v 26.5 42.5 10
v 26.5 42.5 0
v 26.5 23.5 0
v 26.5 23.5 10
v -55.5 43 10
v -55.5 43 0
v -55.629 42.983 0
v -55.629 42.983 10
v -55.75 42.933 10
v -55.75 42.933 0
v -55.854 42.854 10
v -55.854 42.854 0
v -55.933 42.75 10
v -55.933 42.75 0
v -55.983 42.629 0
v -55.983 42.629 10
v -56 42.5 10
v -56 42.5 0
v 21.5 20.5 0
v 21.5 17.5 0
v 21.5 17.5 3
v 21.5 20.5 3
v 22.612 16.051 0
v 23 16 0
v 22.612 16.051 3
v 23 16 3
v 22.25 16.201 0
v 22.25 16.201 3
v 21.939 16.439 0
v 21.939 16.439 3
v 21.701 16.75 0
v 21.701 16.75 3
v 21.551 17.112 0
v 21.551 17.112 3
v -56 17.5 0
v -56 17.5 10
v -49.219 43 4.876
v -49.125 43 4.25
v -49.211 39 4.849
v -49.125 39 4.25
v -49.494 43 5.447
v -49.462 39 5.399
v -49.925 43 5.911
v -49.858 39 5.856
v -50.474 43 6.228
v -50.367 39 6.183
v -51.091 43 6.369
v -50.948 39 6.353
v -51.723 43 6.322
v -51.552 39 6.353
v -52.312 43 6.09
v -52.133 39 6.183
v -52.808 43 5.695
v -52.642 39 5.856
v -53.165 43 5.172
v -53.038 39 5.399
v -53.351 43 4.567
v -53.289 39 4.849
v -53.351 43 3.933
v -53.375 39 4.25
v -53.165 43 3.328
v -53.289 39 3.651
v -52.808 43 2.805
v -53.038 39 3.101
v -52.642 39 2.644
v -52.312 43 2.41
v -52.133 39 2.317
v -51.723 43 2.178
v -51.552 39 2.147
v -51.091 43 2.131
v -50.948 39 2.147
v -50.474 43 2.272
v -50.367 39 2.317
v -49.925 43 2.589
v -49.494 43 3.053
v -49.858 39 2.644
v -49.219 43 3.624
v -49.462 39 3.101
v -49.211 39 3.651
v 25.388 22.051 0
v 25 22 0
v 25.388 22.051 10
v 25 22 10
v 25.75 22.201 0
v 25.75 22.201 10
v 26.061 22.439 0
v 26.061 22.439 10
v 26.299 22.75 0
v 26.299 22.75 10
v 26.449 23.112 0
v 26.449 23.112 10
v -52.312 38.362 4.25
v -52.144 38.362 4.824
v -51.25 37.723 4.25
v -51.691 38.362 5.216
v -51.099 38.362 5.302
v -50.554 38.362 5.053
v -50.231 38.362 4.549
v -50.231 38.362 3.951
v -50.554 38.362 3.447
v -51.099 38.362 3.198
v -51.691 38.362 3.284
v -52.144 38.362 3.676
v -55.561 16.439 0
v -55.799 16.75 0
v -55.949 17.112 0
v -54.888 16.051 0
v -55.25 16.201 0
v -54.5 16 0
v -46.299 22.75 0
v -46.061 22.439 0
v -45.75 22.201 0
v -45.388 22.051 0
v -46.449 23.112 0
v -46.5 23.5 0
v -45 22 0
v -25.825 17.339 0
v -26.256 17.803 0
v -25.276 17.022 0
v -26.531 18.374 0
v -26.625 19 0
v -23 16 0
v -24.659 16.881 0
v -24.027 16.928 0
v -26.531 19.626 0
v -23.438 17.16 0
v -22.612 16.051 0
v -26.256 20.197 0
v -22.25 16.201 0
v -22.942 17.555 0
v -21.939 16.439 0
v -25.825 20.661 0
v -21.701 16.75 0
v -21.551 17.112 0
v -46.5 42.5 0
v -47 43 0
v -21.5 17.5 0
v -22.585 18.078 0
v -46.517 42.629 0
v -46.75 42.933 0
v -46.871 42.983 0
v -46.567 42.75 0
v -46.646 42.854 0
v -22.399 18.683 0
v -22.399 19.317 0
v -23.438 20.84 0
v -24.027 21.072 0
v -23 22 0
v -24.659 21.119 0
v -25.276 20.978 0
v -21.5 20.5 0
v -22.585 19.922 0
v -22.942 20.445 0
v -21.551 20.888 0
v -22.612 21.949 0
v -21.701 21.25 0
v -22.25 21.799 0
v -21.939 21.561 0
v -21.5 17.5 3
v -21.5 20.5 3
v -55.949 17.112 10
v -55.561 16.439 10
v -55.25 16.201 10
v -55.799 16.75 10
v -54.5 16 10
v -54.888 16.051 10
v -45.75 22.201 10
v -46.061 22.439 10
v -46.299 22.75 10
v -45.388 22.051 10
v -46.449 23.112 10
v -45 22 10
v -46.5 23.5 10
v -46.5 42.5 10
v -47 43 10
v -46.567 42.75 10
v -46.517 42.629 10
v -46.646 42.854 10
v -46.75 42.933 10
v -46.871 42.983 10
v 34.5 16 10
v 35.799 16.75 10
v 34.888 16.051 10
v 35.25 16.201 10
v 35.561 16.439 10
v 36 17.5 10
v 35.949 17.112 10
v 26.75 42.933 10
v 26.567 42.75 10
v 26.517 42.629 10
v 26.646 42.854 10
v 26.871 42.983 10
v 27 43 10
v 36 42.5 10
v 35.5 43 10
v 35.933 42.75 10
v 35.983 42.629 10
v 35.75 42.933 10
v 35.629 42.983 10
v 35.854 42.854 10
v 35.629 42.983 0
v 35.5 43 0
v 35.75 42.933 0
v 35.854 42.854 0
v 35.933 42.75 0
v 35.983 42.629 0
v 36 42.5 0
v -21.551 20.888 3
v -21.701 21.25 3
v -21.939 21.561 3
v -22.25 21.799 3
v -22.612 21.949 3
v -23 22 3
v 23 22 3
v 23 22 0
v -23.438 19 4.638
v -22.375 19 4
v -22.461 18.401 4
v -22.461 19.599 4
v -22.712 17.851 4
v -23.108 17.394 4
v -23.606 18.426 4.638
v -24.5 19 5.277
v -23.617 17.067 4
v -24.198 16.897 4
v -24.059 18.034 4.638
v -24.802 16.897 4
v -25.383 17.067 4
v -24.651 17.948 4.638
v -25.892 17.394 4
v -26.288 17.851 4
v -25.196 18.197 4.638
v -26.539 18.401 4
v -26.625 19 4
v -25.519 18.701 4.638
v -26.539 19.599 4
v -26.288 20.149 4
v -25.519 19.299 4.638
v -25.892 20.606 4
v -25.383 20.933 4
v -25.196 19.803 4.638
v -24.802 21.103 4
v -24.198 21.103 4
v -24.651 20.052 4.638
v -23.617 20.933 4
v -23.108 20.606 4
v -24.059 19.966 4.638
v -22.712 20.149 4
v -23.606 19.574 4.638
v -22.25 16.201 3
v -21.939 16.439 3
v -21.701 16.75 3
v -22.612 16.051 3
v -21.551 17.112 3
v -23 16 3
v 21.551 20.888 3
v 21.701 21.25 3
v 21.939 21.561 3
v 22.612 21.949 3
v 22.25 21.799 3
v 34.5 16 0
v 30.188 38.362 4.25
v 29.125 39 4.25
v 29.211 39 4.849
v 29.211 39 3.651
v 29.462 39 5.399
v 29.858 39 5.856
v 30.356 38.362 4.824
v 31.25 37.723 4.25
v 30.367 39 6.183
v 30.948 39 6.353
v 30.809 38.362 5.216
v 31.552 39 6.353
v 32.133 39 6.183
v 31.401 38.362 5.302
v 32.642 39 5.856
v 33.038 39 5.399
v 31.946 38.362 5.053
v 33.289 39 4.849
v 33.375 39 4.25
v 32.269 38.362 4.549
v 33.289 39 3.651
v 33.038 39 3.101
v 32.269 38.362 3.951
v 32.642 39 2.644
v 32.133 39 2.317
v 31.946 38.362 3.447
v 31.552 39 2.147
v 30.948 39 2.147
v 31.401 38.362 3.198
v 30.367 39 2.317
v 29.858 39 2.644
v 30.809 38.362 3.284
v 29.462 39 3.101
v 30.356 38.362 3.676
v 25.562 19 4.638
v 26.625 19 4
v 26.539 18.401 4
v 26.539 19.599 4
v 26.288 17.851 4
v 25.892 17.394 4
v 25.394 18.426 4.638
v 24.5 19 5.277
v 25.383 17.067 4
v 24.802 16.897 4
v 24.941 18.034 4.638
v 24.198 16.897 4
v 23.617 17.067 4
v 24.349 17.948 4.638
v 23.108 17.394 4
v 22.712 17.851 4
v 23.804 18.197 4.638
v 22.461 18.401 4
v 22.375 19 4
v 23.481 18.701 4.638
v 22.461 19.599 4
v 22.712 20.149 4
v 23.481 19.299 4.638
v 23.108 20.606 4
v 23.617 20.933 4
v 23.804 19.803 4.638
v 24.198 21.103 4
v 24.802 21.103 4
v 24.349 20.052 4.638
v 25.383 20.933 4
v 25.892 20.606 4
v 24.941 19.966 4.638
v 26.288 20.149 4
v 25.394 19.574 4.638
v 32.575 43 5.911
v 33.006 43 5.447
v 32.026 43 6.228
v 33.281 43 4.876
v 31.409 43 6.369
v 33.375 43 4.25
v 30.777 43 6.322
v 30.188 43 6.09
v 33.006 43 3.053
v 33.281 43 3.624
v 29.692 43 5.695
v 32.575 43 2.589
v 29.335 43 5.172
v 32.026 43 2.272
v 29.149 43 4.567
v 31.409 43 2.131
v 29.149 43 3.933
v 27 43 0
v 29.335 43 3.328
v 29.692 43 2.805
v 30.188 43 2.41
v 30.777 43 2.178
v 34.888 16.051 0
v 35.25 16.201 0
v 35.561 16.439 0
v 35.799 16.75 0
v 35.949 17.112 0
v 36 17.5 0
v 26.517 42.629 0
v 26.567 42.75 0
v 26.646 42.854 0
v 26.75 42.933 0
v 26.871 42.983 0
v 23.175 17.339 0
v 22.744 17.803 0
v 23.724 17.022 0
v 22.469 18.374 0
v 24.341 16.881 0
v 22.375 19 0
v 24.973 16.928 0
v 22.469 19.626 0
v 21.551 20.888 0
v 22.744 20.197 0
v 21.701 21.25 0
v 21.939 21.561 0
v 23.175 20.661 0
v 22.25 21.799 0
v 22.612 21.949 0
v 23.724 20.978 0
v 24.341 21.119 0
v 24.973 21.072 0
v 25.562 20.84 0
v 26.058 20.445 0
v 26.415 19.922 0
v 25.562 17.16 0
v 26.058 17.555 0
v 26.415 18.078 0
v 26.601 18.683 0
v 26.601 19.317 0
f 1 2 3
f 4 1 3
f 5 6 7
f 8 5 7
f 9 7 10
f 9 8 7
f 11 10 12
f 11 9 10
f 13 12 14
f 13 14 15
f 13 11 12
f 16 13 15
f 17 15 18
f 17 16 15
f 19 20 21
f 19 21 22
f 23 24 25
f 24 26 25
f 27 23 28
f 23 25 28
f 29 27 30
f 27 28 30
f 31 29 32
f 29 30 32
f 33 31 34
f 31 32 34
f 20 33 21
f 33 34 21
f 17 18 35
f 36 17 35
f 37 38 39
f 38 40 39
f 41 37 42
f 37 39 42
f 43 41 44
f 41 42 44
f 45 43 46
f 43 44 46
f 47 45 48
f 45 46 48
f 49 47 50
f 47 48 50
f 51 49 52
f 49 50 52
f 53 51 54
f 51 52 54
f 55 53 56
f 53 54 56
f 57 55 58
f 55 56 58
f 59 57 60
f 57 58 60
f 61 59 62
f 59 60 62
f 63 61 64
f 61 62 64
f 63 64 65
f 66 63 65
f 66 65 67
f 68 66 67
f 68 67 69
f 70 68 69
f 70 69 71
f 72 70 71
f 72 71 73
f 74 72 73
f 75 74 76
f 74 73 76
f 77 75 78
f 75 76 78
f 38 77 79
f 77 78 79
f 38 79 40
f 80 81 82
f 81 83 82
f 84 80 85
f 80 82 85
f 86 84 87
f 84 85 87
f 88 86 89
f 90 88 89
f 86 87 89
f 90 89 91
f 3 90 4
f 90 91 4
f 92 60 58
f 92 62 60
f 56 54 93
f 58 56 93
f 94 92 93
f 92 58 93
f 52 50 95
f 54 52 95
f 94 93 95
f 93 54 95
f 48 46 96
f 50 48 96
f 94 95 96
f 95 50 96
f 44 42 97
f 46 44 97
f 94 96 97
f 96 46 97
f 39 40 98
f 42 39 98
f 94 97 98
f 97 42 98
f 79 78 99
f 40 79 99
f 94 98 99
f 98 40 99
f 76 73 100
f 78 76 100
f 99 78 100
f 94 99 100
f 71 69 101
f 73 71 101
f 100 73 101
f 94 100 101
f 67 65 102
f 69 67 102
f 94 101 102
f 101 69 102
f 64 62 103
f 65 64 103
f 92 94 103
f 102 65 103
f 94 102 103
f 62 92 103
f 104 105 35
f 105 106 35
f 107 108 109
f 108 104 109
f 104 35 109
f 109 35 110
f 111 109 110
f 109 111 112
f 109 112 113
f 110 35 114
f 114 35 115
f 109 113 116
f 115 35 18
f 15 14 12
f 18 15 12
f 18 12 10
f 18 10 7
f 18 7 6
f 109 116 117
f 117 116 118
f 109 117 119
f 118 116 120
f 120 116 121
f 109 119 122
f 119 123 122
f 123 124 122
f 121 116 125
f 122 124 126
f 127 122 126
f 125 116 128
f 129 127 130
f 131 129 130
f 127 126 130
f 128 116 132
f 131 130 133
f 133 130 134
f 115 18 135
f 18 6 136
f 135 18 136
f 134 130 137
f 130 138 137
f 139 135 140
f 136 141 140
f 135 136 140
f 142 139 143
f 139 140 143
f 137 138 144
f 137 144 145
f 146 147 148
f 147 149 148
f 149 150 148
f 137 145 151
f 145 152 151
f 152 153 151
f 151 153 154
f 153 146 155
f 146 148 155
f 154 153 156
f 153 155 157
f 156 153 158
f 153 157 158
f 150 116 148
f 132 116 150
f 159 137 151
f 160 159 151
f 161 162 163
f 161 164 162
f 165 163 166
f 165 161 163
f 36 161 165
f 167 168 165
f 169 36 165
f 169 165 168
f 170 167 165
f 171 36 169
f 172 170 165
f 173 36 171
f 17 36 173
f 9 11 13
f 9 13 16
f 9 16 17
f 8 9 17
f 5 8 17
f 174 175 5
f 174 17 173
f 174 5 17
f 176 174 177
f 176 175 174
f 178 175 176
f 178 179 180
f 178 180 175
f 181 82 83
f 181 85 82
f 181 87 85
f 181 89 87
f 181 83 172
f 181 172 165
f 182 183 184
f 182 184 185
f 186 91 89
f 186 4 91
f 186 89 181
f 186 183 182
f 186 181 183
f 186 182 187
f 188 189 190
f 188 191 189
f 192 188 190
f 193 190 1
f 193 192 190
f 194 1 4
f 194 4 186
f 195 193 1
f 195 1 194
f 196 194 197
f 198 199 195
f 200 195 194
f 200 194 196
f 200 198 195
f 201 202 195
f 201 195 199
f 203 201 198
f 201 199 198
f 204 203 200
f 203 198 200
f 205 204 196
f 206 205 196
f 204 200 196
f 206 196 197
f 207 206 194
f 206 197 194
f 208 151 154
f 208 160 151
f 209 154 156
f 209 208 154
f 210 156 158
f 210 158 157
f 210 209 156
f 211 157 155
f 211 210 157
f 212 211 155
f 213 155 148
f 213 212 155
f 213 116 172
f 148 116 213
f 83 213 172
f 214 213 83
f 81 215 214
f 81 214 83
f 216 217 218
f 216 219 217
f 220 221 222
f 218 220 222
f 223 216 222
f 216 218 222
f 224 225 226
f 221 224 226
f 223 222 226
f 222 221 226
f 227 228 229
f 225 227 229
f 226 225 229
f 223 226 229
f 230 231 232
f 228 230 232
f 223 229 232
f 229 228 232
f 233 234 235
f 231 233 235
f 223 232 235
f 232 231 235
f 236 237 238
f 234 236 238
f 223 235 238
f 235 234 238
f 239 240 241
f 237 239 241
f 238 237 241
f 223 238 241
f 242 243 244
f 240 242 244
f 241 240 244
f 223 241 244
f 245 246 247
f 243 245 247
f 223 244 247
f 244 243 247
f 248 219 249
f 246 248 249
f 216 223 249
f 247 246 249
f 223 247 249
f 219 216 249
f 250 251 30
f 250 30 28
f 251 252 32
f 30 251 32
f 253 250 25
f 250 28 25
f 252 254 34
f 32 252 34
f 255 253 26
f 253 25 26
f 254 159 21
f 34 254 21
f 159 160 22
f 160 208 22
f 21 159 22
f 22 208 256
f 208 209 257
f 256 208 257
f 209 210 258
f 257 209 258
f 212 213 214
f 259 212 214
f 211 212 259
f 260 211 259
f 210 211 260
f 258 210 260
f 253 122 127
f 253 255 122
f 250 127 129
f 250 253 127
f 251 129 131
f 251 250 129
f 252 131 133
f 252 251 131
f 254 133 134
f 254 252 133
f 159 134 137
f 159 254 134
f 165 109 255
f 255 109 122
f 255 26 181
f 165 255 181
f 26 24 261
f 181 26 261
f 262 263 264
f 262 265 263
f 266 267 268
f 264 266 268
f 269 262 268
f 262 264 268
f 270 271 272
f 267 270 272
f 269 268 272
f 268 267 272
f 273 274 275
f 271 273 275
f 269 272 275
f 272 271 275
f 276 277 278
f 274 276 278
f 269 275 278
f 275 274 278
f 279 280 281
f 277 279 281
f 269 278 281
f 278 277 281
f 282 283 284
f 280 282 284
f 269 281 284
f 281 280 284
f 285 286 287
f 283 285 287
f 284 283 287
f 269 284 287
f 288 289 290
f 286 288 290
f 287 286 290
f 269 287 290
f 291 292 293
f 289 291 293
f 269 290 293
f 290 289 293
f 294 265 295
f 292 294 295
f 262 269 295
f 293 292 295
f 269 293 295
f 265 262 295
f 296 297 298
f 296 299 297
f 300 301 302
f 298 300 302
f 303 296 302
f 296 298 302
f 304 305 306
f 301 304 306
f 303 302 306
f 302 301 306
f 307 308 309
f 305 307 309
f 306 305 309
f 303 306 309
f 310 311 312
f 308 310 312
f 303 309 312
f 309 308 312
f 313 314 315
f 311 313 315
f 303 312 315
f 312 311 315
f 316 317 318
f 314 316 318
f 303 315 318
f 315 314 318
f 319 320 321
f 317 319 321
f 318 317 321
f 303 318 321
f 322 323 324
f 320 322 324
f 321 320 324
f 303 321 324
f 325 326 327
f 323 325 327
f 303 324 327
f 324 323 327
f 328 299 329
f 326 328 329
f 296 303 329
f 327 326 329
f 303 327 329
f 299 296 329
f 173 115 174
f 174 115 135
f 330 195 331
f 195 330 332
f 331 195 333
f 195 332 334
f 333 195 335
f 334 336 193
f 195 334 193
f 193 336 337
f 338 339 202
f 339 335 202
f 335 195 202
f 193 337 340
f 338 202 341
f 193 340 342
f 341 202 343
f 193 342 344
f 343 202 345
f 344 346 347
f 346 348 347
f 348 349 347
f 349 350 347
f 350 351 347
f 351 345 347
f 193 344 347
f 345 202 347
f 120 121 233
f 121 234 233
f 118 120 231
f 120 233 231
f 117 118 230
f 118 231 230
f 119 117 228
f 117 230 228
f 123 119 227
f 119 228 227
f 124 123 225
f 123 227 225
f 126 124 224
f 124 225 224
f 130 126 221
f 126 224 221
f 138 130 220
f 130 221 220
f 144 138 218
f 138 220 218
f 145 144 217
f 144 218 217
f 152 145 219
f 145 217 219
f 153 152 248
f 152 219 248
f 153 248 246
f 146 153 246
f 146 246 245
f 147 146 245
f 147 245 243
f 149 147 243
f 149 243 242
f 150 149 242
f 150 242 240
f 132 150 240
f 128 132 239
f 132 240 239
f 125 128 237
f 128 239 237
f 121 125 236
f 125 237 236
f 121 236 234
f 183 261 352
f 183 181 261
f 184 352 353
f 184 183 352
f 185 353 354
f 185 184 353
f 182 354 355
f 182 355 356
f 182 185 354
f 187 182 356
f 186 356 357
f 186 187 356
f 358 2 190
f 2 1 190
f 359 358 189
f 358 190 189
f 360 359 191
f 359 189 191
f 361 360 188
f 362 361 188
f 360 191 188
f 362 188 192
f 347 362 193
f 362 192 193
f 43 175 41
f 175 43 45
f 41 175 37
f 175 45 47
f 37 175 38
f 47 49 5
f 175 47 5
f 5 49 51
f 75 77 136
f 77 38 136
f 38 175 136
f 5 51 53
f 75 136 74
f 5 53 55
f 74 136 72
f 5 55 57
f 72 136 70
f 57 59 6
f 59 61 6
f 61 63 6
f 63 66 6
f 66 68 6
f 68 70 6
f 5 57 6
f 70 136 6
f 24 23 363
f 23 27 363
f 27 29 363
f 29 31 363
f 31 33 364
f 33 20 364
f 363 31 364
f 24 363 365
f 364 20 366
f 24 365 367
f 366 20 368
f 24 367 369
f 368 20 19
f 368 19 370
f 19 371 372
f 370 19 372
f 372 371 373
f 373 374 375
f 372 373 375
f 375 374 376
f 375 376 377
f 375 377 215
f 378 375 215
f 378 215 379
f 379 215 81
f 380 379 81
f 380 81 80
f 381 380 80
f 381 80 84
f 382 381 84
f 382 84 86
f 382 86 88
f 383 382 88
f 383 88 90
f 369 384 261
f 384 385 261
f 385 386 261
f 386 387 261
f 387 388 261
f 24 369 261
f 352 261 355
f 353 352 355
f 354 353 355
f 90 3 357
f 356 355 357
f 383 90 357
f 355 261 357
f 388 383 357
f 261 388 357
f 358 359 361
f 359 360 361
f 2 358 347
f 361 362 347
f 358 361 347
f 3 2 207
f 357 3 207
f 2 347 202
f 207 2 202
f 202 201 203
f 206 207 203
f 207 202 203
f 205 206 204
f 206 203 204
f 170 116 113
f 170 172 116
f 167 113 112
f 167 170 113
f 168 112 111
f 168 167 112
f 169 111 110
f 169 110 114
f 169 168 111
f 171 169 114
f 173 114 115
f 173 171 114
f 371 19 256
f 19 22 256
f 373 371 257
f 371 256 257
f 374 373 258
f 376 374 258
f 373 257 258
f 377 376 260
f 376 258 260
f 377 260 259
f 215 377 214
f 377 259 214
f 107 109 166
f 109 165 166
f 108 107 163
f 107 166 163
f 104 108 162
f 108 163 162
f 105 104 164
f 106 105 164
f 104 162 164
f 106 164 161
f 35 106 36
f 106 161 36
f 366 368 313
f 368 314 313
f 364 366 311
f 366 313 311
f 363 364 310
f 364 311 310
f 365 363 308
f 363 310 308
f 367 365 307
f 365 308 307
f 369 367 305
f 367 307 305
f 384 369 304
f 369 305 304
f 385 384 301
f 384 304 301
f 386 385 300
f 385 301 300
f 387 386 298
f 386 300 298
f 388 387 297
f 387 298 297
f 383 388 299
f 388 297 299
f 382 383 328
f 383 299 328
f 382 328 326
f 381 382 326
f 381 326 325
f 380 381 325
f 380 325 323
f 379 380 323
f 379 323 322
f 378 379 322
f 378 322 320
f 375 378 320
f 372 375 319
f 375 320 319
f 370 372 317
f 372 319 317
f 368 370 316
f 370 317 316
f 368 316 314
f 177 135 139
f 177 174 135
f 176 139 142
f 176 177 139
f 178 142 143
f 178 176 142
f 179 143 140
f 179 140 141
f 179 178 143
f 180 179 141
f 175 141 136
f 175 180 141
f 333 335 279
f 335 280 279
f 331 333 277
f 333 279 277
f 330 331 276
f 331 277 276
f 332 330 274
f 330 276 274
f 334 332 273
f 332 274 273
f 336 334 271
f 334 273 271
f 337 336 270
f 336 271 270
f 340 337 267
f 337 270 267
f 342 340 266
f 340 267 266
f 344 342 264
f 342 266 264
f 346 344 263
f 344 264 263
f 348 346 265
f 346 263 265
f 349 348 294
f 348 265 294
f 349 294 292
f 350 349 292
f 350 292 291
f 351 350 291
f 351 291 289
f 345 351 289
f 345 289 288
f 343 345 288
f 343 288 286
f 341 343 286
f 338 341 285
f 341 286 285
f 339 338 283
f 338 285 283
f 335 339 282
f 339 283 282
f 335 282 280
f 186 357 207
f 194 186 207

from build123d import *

# Parameters (mm, degrees)
F1_W     = 5
F1_H     = 6
F2_DEPTH = 10
F1_W_2   = 25
F3_START = 3
F1_W_3   = 43
F3_DEPTH = 7
F5_D     = 4.25
F5_DEPTH = 4
F5_TIP   = 1.2768288154
F6_D     = 4.25
F6_DEPTH = 4
F6_TIP   = 1.2768288154
F7_R     = 1.5
F8_R     = 0.5


with BuildPart() as f2:
    # F1 (on Top) → F2 (new body)
    with BuildSketch(Plane.XY):
        Polygon((36, 43), (26.5, 43), (26.5, 22), (26.5, 16), (36, 16), align=None)
        with Locations((24, 19)):
            Rectangle(F1_W, F1_H)
    extrude(amount=F2_DEPTH)



with BuildPart() as f2b:
    # F1 (on Top) → F2, piece 2 (new body)
    with BuildSketch(Plane.XY):
        Polygon((-46.5, 16), (-46.5, 22), (-46.5, 43), (-56, 43), (-56, 16), align=None)
        with Locations((-34, 19)):
            Rectangle(F1_W_2, F1_H)
    extrude(amount=F2_DEPTH)


with BuildPart() as f2_1:
    add(f2.part)

    add(f2b.part)  # F3 merges F2b
    # F1 (on Top) → F3 (join)
    with BuildSketch(Plane.XY.offset(F3_START)):
        with Locations((0, 19)):
            Rectangle(F1_W_3, F1_H)
    extrude(amount=F3_DEPTH)

    # F5
    with Locations(Plane(origin=(0, 43, 0), x_dir=(-1, 0, 0), z_dir=(0, 1, 0))):
        with Locations((-31.25, 4.25), (51.25, 4.25)):
            Hole(F5_D / 2, depth=F5_DEPTH)
            with Locations((0, 0, -(F5_DEPTH + F5_TIP / 2))):  # 118° drill point
                Cone(0, F5_D / 2, F5_TIP, mode=Mode.SUBTRACT)

    # F6
    with Locations(Plane(origin=(0, 0, 0), x_dir=(1, 0, 0), z_dir=(0, 0, -1))):
        with Locations((24.5, -19), (-24.5, -19)):
            Hole(F6_D / 2, depth=F6_DEPTH)
            with Locations((0, 0, -(F6_DEPTH + F6_TIP / 2))):  # 118° drill point
                Cone(0, F6_D / 2, F6_TIP, mode=Mode.SUBTRACT)

    # F7
    f7_edges = [f2_1.edges().sort_by_distance(p)[0] for p in [
        (26.5, 22, 5),
        (-46.5, 22, 5),
        (36, 16, 5),
        (-56, 16, 5),
        (21.5, 22, 1.5),
        (21.5, 16, 1.5),
        (-21.5, 22, 1.5),
        (-21.5, 16, 1.5),
    ]]
    fillet(f7_edges, radius=F7_R)

    # F8
    f8_edges = [f2_1.edges().sort_by_distance(p)[0] for p in [
        (36, 43, 5),
        (26.5, 43, 5),
        (-46.5, 43, 5),
        (-56, 43, 5),
    ]]
    fillet(f8_edges, radius=F8_R)


solid = f2_1.part
